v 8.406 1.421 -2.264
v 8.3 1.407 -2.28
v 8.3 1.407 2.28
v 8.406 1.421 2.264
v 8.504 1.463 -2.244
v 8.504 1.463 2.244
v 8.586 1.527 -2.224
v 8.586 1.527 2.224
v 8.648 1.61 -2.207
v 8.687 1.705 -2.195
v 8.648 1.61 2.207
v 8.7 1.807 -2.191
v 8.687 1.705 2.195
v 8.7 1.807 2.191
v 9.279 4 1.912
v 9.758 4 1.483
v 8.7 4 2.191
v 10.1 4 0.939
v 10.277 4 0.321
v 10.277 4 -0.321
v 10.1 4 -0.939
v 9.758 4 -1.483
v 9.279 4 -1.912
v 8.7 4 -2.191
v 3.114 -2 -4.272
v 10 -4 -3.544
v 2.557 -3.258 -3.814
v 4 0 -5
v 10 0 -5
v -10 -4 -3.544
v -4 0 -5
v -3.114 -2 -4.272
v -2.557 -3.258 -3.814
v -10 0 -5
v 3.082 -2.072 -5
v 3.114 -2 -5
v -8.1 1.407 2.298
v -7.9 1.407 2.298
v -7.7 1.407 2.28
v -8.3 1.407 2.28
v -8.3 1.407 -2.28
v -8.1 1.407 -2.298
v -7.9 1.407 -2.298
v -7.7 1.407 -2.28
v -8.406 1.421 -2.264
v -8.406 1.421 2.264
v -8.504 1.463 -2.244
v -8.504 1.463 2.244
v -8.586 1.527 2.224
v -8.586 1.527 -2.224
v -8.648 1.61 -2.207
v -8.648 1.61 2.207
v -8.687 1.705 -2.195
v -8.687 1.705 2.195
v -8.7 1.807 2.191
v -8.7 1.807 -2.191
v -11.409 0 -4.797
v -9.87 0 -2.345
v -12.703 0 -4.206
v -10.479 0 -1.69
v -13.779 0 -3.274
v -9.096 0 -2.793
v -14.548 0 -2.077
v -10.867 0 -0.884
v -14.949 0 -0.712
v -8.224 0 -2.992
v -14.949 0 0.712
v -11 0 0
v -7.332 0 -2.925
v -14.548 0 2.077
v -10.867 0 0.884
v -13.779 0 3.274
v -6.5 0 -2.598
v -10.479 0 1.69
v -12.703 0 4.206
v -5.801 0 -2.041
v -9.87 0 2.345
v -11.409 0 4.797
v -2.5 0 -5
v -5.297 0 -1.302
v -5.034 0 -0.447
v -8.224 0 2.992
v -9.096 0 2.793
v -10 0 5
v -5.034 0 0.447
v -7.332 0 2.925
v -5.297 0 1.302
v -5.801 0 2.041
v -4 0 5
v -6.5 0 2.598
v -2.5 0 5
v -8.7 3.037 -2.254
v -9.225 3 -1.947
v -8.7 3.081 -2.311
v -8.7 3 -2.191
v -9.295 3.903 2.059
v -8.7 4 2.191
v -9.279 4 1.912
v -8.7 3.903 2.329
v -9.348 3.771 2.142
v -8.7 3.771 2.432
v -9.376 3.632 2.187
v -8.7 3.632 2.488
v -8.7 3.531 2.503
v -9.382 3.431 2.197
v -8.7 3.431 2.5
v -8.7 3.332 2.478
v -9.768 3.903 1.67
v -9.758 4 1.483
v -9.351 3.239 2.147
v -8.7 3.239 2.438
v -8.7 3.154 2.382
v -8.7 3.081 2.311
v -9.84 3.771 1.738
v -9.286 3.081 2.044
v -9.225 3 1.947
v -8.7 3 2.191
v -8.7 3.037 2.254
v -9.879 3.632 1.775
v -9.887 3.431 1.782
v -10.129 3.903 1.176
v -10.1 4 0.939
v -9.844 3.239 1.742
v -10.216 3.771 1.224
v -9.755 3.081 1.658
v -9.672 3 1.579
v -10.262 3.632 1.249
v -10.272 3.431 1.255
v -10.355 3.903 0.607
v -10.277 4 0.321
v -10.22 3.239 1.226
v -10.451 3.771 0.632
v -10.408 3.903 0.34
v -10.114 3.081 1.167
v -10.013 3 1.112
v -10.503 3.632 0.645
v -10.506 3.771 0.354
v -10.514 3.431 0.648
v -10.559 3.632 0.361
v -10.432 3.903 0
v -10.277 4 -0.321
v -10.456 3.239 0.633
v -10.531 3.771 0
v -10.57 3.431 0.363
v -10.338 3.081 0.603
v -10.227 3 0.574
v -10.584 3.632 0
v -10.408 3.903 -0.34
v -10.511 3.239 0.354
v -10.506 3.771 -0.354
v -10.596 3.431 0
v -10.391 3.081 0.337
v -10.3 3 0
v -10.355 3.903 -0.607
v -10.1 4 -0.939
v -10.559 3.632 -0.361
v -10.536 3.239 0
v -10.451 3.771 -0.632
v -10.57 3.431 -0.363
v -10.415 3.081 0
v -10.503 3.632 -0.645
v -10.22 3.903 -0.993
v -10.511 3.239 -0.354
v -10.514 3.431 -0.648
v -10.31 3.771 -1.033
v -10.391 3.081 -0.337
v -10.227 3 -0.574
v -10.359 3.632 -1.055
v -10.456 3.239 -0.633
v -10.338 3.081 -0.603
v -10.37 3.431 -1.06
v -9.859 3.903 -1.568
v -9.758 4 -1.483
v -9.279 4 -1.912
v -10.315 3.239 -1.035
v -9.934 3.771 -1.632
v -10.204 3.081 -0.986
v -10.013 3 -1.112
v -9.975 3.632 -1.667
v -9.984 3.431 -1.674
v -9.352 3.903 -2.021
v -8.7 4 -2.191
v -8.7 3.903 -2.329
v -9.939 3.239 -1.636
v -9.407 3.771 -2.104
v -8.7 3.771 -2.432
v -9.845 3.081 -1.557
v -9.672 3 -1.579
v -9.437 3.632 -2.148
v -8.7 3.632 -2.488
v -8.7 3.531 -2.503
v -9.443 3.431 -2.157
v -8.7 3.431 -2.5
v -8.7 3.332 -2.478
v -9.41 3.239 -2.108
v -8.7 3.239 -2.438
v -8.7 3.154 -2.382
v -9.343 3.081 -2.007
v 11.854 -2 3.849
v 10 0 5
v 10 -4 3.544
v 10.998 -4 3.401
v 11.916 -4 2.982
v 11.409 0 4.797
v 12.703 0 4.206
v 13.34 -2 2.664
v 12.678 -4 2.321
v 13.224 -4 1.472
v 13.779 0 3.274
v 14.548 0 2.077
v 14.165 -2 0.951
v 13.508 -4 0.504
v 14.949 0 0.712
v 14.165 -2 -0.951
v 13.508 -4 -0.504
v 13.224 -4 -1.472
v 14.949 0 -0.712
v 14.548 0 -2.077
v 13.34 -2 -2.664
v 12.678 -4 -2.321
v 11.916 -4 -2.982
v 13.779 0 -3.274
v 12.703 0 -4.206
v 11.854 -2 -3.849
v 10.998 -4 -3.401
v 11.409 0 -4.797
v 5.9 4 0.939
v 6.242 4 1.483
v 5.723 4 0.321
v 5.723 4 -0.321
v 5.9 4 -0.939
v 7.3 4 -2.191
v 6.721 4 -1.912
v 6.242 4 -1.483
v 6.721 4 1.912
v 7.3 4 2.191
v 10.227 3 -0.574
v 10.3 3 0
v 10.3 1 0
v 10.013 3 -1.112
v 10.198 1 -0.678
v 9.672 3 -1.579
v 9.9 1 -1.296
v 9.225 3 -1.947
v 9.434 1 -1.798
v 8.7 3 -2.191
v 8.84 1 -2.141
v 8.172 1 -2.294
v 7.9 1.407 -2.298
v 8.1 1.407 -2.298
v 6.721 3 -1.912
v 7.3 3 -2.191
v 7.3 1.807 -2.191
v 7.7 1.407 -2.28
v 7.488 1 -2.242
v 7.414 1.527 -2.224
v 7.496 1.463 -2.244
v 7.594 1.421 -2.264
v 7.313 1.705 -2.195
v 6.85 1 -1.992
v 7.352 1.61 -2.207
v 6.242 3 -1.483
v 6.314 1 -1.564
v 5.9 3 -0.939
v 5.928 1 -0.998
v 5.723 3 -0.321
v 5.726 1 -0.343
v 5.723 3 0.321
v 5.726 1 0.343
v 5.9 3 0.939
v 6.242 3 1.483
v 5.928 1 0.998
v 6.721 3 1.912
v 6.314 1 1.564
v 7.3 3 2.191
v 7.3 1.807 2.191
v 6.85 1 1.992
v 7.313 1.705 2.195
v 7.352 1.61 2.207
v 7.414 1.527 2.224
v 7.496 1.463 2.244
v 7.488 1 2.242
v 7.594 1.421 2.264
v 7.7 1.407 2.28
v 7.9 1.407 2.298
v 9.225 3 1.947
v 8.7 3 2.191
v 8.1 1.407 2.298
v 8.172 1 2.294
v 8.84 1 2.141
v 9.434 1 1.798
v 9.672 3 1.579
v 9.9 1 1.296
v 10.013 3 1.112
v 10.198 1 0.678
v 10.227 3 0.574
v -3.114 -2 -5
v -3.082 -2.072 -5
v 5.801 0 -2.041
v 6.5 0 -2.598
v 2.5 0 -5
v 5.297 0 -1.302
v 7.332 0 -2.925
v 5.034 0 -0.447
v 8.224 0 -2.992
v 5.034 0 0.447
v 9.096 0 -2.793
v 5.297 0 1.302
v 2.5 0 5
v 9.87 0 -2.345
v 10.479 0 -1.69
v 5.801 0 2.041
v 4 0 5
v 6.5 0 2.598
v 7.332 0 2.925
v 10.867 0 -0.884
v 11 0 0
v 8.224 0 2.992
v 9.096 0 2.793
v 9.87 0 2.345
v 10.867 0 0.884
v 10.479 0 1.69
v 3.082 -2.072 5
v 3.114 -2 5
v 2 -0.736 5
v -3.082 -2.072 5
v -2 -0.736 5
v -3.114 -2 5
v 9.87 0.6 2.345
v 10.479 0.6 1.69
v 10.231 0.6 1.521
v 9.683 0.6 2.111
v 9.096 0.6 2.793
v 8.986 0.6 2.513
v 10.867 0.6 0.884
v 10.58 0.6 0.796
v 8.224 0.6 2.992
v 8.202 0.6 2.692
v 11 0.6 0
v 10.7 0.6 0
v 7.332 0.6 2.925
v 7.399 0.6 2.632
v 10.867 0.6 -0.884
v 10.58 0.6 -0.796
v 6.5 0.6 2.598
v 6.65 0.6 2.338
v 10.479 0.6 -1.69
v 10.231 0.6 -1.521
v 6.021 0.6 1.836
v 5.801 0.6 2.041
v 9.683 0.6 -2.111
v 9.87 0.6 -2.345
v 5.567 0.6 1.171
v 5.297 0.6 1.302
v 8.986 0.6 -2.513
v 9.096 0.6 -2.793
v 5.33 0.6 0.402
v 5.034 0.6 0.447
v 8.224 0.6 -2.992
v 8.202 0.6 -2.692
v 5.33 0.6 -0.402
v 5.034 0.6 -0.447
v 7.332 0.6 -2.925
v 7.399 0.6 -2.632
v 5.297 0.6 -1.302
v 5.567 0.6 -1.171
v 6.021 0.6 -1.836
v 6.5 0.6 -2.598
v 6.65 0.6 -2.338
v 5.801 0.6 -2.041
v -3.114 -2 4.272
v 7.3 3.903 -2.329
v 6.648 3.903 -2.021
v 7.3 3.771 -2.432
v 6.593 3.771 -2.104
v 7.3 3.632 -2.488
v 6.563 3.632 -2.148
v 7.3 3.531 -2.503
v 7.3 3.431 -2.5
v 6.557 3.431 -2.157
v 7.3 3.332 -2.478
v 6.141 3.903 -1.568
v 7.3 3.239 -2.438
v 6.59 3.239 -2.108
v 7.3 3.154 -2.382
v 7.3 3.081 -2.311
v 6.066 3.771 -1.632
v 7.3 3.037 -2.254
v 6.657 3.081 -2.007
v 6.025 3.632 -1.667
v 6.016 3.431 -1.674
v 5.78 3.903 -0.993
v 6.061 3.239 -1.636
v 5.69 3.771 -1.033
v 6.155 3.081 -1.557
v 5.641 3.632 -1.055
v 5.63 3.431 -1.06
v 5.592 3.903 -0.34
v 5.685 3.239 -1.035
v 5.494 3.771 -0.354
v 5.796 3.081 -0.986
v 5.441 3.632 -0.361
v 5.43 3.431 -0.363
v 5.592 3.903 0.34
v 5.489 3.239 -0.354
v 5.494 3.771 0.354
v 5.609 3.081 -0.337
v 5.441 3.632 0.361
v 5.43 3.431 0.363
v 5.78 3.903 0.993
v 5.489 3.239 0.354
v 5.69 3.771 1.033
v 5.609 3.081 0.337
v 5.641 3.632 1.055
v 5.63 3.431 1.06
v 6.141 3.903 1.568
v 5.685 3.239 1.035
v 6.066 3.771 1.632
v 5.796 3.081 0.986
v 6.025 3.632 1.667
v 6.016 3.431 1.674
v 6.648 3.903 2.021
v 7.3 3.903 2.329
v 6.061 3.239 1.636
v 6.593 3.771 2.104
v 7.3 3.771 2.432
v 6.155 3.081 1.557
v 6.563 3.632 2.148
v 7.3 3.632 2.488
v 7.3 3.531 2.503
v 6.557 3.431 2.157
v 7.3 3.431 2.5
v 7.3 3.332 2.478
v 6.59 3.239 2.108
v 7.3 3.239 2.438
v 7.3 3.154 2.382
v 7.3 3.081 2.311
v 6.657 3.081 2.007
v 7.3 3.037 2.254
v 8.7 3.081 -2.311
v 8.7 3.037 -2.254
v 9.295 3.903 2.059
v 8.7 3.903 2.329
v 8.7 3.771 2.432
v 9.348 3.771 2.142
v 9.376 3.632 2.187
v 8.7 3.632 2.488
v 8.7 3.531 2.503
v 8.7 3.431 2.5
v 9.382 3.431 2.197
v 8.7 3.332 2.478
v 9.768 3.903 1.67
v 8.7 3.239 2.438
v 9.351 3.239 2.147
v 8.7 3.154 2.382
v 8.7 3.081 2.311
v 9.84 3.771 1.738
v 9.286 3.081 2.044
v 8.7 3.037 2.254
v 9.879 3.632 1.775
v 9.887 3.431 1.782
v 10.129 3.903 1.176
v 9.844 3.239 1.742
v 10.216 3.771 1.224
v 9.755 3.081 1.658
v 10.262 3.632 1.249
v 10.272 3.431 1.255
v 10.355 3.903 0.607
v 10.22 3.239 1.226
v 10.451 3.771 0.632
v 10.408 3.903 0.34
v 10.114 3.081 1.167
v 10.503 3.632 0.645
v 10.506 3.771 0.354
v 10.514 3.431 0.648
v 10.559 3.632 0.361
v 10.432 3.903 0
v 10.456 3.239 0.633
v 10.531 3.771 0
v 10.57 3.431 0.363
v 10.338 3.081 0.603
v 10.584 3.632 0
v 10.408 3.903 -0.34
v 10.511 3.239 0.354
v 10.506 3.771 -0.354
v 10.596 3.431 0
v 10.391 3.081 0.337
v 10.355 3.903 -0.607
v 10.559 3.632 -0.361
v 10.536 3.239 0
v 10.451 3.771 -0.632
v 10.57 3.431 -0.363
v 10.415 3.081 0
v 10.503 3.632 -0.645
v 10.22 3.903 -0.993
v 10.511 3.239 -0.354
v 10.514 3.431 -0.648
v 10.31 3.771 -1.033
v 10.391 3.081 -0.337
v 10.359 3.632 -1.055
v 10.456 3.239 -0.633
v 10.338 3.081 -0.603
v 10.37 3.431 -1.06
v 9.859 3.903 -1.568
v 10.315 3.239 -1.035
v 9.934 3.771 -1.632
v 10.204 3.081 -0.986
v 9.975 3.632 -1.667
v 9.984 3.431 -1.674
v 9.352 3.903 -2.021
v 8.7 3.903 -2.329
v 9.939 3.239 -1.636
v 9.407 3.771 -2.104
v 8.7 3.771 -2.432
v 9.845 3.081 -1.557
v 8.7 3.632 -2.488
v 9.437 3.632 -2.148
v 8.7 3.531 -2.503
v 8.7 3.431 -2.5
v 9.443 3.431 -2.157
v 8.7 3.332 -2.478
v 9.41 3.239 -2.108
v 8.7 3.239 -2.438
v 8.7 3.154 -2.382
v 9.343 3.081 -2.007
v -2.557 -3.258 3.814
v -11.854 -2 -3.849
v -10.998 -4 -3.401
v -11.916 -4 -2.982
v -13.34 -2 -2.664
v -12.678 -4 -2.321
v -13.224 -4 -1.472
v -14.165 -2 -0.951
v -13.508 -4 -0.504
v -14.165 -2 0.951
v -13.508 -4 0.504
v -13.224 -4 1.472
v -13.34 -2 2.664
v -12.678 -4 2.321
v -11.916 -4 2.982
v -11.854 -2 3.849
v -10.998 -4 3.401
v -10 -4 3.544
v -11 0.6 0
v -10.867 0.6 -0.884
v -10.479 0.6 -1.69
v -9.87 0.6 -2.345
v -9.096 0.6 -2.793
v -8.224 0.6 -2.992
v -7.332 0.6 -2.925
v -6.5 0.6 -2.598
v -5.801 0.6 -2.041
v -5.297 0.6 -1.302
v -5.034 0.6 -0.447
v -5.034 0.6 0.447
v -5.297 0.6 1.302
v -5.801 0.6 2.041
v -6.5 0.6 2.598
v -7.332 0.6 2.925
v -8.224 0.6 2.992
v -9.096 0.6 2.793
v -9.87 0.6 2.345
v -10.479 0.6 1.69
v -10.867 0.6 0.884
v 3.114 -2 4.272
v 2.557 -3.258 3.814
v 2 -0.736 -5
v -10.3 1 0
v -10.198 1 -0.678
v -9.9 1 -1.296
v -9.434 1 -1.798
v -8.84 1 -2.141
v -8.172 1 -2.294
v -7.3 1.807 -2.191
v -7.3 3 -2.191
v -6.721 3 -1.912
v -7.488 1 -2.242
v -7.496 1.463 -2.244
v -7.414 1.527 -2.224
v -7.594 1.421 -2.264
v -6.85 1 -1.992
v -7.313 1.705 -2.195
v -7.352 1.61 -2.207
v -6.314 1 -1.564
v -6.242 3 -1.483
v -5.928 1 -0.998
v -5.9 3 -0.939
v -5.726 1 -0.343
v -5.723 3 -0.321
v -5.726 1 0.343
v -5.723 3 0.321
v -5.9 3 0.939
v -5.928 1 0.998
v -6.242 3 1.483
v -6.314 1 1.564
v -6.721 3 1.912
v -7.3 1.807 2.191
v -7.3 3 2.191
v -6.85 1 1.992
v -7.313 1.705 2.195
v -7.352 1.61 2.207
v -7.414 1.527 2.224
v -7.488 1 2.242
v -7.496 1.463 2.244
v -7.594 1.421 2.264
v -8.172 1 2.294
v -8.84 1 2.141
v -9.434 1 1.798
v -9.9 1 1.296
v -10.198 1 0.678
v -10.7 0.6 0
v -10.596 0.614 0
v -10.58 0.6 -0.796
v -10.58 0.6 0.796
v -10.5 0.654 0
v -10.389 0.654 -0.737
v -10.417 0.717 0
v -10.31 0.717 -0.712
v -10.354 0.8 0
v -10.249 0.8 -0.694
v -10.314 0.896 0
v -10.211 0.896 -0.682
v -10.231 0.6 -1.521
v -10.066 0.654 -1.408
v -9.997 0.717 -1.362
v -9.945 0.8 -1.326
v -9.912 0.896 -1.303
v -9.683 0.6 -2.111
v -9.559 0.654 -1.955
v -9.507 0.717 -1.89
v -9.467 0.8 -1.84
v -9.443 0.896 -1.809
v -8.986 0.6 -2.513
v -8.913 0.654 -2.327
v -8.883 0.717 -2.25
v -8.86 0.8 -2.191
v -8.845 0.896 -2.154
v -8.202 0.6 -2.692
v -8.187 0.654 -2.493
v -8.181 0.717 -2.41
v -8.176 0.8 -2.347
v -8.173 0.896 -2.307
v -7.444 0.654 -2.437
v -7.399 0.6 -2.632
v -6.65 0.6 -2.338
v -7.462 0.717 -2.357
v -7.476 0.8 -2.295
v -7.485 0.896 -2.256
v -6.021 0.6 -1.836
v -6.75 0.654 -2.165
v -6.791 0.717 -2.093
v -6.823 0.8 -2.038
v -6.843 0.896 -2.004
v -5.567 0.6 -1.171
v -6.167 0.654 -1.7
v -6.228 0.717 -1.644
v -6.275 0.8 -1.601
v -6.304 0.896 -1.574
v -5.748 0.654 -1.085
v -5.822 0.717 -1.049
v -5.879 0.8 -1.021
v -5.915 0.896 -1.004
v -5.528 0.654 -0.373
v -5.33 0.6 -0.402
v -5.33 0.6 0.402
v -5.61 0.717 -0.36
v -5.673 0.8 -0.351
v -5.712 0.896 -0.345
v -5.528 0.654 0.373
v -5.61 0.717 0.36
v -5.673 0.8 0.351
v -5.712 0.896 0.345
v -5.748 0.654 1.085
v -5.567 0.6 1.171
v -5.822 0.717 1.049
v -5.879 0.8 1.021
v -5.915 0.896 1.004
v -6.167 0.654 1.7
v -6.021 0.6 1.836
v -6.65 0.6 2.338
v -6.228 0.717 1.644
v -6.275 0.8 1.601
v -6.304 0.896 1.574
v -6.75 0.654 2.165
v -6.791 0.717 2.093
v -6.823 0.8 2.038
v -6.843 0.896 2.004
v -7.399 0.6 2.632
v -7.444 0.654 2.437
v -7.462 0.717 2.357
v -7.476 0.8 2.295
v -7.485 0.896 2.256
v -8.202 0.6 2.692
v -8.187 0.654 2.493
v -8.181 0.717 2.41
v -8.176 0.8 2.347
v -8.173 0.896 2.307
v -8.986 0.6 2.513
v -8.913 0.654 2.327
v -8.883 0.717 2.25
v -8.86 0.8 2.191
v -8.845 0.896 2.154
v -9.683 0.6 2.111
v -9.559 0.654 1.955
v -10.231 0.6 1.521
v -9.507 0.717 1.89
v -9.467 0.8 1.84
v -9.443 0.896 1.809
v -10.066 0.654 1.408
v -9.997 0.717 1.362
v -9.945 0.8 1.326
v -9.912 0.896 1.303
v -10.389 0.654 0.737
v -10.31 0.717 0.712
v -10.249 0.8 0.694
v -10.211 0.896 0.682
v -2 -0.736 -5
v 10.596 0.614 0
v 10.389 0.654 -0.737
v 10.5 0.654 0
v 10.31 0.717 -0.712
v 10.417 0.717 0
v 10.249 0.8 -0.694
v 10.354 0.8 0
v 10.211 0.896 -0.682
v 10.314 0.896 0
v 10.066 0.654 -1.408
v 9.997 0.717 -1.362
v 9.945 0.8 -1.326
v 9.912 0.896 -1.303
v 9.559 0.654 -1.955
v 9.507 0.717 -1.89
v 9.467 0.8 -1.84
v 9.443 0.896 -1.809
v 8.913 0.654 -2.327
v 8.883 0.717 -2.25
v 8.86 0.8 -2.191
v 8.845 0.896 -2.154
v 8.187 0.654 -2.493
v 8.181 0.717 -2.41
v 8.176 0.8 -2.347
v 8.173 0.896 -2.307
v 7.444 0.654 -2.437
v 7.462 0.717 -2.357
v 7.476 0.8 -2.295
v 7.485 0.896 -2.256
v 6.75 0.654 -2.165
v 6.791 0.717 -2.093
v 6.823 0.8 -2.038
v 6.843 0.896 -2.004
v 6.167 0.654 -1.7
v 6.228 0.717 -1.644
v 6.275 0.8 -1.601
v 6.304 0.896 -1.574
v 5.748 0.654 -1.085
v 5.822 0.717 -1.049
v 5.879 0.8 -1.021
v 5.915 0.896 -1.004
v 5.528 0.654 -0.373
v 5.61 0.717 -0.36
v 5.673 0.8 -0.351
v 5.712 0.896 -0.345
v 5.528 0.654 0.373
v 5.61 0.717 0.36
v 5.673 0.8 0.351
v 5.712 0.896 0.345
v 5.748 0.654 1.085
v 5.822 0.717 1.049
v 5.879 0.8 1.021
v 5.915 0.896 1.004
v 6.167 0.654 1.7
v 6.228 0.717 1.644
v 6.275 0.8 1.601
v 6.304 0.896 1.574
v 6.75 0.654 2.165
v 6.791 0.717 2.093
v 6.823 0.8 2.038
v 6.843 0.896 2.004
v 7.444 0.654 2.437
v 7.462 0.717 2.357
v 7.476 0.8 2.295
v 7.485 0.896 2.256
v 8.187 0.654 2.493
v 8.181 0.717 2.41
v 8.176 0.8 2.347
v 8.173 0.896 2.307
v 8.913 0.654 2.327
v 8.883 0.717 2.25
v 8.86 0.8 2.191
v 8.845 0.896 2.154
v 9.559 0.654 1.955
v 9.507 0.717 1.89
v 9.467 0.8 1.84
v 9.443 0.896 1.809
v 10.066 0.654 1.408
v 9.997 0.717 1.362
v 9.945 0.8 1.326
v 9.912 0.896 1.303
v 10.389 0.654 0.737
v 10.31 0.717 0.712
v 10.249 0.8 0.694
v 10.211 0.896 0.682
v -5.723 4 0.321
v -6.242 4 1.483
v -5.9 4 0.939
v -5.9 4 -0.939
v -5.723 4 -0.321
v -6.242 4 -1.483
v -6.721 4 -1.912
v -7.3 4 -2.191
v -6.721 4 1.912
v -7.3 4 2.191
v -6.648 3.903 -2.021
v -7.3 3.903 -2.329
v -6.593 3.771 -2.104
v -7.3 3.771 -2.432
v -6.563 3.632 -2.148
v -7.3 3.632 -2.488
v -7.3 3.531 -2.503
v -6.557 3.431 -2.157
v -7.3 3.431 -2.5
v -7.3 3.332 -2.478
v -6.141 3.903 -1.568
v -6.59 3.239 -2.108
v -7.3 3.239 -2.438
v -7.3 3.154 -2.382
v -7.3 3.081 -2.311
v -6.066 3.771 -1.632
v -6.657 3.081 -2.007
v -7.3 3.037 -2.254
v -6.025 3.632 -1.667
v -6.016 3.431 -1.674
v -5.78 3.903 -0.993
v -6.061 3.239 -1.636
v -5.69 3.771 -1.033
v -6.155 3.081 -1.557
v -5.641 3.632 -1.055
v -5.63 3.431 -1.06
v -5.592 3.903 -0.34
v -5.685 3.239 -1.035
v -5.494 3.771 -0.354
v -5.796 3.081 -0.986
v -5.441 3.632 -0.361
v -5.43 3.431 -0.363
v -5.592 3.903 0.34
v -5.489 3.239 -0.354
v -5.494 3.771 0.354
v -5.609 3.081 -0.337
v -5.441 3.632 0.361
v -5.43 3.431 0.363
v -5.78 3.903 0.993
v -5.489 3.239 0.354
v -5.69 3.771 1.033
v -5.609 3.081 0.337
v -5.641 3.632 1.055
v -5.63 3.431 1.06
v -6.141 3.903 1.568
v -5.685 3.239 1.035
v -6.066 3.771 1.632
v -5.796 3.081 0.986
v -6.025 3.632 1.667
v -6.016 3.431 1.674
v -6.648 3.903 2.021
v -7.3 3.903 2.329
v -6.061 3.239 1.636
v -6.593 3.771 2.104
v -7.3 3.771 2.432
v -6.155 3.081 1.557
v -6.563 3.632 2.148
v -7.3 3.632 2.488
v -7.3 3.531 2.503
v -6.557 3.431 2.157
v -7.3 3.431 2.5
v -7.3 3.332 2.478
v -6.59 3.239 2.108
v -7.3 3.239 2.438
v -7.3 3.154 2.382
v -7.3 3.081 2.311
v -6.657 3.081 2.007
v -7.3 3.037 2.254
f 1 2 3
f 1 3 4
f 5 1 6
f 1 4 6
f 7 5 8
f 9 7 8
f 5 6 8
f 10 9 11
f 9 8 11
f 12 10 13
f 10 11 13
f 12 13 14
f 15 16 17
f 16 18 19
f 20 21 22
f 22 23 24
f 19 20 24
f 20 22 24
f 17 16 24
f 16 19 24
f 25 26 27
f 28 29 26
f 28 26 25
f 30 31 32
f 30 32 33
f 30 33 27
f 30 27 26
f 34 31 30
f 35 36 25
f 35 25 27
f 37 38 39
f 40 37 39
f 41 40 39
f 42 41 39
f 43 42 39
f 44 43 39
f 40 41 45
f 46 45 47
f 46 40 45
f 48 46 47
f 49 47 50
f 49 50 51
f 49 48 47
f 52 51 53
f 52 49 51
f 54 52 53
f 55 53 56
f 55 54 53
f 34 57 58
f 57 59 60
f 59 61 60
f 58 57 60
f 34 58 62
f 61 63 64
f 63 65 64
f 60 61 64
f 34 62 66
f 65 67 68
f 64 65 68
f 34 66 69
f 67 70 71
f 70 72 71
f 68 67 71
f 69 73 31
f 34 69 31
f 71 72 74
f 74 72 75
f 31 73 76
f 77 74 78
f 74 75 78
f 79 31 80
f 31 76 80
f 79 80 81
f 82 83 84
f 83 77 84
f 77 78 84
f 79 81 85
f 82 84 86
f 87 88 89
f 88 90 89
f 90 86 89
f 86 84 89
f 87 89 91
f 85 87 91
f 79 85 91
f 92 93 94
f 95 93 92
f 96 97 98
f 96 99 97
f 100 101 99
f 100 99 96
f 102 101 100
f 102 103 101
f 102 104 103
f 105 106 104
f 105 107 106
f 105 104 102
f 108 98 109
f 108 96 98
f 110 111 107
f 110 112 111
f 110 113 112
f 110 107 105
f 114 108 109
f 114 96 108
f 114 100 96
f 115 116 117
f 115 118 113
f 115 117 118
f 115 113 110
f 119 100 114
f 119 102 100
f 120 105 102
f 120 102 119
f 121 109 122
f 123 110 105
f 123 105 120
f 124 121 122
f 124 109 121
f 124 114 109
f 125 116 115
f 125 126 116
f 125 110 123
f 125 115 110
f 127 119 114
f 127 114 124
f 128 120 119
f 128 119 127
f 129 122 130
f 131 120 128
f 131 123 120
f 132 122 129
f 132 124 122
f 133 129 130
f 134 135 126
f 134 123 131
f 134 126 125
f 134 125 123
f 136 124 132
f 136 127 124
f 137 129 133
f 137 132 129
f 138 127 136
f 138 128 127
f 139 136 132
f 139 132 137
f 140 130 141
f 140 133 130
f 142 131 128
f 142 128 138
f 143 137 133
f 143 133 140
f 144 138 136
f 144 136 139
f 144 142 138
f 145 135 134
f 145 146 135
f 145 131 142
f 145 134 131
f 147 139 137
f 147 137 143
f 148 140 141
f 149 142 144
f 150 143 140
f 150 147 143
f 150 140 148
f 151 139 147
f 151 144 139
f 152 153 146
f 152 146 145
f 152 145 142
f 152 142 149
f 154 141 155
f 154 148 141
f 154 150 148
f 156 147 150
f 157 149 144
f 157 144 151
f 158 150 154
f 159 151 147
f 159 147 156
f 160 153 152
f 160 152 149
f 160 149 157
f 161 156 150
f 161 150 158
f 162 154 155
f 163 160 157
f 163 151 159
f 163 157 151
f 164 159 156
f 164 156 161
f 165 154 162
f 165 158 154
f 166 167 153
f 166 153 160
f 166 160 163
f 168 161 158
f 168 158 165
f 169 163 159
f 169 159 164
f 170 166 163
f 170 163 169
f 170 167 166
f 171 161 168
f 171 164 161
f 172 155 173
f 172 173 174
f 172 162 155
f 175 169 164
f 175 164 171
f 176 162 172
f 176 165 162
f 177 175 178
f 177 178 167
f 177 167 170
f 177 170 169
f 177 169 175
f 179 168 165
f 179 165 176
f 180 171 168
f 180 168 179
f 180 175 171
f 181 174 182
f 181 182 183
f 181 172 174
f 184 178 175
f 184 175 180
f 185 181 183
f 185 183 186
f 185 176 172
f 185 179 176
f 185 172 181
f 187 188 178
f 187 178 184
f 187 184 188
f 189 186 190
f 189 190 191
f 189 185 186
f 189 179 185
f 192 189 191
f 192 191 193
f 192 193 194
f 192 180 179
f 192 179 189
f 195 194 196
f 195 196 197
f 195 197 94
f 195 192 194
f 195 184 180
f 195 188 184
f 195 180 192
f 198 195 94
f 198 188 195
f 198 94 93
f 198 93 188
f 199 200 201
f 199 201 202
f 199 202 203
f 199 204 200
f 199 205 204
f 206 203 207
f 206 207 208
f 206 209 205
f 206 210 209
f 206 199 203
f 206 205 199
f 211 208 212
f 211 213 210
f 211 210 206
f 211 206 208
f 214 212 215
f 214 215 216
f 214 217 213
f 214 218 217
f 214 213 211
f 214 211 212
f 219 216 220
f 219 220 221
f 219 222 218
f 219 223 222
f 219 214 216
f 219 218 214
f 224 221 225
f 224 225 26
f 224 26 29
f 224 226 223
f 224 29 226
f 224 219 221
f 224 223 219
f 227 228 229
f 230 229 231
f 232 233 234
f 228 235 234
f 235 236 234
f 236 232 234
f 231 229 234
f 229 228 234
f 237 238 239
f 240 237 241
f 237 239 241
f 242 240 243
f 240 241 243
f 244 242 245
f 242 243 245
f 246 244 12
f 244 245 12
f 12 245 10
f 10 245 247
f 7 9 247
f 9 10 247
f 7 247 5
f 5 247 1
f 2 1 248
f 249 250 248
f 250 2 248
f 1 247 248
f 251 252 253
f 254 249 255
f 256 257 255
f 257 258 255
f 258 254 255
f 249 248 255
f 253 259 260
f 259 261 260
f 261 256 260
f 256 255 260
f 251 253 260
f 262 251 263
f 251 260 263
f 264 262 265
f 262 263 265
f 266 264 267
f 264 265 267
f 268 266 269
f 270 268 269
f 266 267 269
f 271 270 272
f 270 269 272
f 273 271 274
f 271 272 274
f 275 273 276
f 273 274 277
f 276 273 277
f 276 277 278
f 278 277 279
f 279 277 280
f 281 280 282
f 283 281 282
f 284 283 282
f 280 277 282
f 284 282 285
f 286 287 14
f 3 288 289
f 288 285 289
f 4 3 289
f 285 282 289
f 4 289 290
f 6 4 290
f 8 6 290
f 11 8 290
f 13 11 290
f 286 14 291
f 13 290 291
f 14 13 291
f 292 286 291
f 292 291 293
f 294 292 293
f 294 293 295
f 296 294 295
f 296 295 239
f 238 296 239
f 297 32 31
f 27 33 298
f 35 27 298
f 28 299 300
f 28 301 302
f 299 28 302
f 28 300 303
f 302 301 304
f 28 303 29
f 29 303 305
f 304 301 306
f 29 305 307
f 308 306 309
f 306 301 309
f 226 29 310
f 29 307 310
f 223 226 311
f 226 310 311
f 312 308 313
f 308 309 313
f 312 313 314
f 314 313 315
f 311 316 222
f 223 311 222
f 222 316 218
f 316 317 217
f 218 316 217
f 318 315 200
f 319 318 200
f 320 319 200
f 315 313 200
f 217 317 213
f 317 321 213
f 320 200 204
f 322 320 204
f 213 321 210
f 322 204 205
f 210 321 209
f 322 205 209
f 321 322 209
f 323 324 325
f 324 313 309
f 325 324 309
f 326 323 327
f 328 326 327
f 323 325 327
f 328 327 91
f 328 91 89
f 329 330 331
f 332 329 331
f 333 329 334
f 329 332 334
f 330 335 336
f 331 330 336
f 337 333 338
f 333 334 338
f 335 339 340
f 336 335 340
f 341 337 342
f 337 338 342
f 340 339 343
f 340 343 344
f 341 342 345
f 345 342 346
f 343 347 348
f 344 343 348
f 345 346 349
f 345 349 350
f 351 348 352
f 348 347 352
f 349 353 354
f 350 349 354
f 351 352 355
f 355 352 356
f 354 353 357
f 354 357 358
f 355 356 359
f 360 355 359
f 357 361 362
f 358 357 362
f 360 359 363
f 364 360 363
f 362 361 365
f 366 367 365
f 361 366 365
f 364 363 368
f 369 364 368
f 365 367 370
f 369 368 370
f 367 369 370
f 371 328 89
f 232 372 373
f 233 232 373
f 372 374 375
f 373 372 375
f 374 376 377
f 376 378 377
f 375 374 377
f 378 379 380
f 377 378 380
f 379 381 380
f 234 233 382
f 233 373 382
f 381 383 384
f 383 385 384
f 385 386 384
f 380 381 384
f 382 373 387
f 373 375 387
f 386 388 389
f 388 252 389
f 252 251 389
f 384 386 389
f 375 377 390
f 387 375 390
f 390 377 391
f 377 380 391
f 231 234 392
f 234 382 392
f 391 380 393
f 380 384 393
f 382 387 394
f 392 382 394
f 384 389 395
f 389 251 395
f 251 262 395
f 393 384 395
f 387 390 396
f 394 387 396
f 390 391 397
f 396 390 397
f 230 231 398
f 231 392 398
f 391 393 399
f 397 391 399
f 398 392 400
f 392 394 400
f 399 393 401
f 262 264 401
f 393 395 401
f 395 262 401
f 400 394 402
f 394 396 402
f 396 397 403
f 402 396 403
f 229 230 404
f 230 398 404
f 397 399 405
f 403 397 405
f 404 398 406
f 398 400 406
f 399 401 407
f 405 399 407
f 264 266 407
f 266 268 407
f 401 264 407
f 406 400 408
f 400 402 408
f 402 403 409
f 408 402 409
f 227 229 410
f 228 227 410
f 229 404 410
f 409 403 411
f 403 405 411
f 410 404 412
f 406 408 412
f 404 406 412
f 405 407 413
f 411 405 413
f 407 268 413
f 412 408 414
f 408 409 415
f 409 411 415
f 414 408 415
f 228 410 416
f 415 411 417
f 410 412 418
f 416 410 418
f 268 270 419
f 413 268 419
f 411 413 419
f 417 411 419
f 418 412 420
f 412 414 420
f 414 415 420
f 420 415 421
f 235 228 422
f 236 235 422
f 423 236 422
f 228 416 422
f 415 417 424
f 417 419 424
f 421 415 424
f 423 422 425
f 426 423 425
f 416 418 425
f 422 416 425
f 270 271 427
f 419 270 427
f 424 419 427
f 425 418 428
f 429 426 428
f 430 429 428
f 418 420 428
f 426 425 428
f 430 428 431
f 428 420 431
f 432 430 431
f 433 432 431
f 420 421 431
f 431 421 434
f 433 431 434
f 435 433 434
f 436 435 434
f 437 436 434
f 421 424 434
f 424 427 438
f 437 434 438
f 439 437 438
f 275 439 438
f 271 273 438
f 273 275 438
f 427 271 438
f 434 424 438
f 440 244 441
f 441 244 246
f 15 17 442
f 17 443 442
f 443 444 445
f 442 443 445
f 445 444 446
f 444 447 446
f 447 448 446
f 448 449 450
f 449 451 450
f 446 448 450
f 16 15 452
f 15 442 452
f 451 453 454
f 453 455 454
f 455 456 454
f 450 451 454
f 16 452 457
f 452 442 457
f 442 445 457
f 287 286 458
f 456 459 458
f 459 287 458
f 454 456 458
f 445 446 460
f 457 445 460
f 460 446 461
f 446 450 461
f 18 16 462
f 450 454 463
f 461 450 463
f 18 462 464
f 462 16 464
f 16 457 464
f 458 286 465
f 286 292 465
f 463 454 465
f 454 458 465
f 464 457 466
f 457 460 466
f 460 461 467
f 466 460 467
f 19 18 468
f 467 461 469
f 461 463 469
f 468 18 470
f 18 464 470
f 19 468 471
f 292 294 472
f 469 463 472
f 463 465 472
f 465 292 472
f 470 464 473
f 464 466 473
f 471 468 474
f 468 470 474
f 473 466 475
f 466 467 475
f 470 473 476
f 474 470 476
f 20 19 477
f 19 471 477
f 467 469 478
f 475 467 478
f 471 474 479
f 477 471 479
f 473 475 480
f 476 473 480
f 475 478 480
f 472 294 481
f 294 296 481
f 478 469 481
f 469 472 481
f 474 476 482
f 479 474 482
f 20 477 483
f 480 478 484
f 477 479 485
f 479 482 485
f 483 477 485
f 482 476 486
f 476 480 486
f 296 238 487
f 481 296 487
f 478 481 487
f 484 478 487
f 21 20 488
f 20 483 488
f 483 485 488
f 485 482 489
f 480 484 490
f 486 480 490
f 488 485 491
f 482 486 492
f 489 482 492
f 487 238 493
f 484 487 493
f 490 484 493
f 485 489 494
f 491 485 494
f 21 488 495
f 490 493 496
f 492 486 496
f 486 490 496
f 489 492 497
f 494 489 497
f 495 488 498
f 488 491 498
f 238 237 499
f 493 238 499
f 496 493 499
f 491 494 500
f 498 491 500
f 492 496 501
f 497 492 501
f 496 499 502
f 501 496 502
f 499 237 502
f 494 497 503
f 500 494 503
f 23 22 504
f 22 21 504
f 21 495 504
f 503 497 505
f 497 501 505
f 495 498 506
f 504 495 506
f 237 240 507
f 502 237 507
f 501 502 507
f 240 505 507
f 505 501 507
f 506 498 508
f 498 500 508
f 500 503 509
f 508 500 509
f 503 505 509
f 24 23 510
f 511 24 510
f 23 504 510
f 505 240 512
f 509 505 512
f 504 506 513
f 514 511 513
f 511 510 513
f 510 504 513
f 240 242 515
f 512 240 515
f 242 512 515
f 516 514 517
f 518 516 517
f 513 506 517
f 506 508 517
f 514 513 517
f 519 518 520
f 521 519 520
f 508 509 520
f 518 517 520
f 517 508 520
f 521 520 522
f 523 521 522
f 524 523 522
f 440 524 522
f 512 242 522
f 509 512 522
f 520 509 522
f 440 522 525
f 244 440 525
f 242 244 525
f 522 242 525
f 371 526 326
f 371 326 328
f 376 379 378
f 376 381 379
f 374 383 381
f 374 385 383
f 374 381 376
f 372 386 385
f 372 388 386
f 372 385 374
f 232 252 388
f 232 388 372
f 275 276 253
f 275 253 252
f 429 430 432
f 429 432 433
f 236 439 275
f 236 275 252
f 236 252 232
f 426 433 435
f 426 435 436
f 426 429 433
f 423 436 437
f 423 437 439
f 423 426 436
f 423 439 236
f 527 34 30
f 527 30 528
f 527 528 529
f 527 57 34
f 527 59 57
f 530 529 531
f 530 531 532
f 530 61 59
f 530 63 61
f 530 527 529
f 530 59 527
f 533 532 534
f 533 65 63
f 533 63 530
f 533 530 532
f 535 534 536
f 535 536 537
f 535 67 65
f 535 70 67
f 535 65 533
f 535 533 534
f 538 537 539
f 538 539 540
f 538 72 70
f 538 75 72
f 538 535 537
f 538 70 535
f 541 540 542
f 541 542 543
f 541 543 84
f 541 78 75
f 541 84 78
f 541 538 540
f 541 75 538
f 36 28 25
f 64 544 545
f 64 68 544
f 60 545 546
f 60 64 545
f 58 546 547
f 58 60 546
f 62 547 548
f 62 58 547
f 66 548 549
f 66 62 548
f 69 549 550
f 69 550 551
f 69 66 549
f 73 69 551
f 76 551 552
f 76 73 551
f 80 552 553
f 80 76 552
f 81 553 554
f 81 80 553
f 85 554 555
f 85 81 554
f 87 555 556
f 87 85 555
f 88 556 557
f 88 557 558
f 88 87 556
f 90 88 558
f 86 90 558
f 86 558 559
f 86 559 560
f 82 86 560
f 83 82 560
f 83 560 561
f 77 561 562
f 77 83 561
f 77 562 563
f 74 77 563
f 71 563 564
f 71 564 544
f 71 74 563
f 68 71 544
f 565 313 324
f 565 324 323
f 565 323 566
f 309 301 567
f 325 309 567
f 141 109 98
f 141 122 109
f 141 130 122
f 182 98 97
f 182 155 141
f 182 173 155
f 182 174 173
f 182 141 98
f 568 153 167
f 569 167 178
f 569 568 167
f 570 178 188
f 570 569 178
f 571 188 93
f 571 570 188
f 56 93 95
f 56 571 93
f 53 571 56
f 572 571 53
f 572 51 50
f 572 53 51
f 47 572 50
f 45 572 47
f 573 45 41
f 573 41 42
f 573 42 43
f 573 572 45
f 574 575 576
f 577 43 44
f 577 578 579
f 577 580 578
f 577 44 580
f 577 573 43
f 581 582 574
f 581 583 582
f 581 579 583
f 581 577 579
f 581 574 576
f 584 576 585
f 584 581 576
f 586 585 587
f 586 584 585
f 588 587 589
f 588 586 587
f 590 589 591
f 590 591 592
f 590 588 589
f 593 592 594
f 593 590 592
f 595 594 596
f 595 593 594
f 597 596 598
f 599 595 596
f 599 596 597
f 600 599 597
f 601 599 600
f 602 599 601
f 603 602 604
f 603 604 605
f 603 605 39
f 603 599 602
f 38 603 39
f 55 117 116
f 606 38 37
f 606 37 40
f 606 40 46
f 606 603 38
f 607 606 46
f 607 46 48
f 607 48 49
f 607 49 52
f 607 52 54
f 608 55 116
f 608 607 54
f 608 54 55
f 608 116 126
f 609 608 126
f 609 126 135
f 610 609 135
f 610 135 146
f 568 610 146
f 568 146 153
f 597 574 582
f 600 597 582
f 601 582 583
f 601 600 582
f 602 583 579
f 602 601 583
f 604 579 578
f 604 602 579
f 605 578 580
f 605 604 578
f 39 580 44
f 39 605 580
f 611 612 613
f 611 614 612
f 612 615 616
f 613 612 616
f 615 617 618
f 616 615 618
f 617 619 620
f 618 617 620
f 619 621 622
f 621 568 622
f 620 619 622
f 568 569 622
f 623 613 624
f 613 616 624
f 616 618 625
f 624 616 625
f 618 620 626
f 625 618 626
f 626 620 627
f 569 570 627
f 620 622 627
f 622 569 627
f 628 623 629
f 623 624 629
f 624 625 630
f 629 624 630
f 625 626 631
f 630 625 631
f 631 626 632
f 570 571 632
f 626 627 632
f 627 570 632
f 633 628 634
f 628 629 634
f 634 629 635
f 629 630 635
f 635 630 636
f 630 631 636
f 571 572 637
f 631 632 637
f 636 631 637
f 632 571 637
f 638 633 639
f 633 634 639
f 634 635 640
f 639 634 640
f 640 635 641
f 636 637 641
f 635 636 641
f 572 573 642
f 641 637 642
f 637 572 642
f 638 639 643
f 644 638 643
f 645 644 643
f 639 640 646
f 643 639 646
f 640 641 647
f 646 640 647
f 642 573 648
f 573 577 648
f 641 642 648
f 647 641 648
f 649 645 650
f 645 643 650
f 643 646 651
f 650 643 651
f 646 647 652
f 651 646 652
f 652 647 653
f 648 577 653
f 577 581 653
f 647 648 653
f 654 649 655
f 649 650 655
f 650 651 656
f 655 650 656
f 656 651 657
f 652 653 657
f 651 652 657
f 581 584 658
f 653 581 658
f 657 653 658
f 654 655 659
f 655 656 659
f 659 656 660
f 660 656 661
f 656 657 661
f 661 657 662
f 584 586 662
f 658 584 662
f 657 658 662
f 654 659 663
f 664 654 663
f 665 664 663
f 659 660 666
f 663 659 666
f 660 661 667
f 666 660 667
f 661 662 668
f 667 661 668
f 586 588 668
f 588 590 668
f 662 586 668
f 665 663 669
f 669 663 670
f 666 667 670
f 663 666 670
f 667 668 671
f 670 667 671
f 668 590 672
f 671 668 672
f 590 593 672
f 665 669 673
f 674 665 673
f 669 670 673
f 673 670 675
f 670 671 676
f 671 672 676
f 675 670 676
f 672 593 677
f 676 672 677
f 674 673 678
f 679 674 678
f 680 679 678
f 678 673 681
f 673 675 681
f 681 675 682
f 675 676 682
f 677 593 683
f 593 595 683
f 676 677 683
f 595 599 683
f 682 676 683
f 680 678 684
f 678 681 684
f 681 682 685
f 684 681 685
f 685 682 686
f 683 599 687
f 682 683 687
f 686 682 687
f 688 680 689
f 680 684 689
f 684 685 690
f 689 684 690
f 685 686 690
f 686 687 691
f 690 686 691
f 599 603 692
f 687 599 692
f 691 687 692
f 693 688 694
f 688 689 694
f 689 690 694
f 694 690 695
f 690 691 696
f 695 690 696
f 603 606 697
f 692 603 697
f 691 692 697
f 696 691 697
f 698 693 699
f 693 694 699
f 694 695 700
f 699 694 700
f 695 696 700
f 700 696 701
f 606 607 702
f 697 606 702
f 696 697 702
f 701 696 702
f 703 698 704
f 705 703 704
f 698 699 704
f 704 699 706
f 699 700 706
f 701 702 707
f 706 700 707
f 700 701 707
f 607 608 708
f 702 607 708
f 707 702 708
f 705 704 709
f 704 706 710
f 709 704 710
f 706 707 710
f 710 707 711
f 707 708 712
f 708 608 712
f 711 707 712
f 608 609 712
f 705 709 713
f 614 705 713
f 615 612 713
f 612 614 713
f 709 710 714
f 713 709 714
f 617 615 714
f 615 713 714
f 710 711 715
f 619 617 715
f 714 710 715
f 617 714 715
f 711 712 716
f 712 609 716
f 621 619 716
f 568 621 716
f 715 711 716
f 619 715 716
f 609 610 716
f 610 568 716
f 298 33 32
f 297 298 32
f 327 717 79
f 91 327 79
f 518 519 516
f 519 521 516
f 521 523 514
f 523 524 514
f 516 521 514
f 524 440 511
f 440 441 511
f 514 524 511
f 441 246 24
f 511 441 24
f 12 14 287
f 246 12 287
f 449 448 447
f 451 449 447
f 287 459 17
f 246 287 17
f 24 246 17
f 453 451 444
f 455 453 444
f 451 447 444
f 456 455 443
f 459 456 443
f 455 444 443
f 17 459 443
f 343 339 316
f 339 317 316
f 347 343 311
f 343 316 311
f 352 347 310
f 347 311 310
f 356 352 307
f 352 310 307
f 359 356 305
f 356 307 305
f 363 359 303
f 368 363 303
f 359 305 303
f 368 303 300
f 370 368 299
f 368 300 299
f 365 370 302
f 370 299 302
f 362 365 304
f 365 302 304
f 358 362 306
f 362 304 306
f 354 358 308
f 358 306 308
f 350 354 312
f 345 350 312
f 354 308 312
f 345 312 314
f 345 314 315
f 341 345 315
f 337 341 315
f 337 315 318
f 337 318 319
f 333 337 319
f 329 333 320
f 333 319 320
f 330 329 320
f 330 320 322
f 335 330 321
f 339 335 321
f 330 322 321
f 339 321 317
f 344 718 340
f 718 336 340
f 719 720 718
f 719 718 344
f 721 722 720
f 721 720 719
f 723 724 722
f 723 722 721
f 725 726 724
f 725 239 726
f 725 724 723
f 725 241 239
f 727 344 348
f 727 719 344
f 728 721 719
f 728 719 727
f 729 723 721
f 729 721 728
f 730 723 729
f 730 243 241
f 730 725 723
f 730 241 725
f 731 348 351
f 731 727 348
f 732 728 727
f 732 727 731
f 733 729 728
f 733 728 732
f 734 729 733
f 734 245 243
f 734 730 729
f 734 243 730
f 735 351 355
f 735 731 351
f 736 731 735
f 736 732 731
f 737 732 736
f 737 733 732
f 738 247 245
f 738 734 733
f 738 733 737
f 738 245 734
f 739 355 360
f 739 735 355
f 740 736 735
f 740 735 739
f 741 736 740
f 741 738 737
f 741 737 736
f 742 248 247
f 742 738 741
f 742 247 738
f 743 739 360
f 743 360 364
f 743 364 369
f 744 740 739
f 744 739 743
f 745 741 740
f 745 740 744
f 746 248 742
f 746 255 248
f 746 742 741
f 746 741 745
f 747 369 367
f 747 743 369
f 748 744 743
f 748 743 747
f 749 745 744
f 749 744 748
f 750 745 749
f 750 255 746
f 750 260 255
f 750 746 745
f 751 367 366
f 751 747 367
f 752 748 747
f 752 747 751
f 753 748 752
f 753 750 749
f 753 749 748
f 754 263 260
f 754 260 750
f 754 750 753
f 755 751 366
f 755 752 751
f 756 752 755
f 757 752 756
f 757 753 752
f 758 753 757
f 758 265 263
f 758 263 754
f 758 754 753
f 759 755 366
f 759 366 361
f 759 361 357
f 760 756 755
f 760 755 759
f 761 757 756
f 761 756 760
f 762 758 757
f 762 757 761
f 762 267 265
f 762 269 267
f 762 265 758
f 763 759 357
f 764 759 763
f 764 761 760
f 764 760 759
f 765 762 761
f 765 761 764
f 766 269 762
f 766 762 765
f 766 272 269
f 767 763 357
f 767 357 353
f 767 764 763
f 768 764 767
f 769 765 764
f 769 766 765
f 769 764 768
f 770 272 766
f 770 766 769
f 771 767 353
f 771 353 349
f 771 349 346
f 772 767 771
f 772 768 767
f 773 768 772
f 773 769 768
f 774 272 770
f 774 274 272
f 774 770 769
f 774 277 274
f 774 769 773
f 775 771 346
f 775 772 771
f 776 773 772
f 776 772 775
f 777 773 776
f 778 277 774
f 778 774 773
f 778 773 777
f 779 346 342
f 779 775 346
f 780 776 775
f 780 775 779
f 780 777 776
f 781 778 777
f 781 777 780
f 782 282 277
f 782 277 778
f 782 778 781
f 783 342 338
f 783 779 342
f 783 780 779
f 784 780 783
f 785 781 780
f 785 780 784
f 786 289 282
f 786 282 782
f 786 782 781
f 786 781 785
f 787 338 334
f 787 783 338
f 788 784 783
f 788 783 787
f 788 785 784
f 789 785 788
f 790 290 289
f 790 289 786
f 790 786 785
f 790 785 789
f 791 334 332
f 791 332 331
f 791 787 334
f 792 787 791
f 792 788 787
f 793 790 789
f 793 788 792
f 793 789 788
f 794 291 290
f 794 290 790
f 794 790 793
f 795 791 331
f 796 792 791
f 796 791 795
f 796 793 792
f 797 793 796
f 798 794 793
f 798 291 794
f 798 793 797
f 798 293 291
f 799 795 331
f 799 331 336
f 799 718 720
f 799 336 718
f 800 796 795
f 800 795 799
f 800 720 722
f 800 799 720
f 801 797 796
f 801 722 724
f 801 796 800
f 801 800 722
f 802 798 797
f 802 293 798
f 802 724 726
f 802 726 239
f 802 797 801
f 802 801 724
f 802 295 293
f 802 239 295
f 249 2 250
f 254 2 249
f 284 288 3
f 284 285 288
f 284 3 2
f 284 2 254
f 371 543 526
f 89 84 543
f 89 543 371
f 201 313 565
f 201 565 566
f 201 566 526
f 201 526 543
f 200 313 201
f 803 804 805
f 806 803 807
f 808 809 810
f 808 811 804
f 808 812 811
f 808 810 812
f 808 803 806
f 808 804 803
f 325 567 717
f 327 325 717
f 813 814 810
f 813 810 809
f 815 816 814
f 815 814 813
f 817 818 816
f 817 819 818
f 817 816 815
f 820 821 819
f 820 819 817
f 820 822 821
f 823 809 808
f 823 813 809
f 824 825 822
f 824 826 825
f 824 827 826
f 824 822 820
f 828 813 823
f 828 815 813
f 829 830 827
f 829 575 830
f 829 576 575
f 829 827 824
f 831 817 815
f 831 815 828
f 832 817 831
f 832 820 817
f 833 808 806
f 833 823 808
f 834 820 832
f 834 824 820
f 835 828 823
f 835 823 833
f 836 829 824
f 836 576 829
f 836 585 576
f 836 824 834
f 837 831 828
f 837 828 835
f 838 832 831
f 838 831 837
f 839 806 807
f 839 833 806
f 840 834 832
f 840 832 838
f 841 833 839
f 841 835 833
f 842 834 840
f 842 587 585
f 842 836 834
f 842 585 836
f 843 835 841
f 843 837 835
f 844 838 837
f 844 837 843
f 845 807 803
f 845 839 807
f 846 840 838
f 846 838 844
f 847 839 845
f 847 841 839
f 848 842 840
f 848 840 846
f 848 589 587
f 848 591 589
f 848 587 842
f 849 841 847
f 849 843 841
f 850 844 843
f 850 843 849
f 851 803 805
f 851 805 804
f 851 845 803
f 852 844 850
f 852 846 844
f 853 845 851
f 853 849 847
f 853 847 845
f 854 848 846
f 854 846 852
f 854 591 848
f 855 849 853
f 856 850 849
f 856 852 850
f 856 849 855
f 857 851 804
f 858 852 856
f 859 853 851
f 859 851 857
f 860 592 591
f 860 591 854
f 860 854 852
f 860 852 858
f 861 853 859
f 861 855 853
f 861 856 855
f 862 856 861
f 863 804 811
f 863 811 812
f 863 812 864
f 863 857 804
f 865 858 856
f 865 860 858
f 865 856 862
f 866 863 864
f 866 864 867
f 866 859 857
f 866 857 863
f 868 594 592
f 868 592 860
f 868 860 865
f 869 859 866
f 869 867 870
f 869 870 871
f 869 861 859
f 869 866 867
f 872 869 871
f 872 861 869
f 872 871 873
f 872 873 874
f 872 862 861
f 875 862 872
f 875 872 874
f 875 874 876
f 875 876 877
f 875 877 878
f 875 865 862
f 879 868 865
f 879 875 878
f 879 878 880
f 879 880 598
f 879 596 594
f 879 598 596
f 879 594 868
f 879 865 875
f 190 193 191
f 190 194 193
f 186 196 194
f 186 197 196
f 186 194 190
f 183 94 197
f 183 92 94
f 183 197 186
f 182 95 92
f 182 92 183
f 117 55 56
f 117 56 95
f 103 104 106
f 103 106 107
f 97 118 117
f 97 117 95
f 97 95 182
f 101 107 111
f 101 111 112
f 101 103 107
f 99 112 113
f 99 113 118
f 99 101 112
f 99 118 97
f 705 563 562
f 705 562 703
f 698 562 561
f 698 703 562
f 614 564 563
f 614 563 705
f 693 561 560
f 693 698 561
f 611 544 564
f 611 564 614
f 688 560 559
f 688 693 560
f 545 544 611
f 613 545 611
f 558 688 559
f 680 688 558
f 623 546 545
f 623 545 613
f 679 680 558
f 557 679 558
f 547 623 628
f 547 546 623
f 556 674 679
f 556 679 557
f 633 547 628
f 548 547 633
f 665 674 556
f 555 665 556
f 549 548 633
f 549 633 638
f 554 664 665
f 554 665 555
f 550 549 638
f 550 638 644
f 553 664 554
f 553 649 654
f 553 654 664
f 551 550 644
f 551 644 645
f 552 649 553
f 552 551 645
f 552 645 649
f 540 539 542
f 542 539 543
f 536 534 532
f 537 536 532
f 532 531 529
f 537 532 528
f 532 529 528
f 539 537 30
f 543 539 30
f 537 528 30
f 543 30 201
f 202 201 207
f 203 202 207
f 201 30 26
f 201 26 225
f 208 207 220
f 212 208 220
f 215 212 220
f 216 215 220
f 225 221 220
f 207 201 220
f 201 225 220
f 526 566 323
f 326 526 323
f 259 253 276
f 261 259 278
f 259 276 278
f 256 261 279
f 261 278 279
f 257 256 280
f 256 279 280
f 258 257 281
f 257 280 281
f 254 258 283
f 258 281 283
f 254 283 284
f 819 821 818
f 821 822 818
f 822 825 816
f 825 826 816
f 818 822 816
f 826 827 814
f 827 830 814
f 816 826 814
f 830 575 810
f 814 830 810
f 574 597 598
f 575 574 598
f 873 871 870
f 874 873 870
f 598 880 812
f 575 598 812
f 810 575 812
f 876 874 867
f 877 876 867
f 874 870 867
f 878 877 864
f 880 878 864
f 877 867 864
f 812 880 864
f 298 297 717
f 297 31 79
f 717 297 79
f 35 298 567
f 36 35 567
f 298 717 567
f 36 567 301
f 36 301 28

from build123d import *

# Parameters (mm, degrees)
BOSS_EXTRUDE1_DEPTH     = 4
BOSS_EXTRUDE1_DRAFT     = -20
SKETCH3_W               = 1.4
SKETCH3_H               = 6
CUT_EXTRUDE1_DEPTH      = 17.309506455
FILLET1_R               = 0.4
FILLET1_OF_MIRROR1_R    = 0.4
BOSS_EXTRUDE2_DEPTH     = 5
CHAMFER1_SIZE           = 1.338525748
CHAMFER1_SIZE_2         = 0.8
CUT_EXTRUDE2_DEPTH      = 17.309506455
CUT_EXTRUDE2_DEPTH_BACK = 17.309506455


with BuildPart() as part:
    # Sketch1 → Boss-Extrude1 (with draft: the straight prism first)
    with BuildSketch(Plane(origin=(0, 0, 0), x_dir=(1, 0, 0), z_dir=(0, 1, 0))):
        with BuildLine():
            ThreePointArc((-10, 5), (-15, 0), (-10, -5))
            Line((-10, -5), (10, -5))
            ThreePointArc((10, -5), (15, 0), (10, 5))
            Line((10, 5), (-10, 5))
        make_face()
    extrude(amount=-BOSS_EXTRUDE1_DEPTH)
    # Boss-Extrude1: the draft: its side faces are tilted about the plane it starts from
    boss_extrude1_sides = [part.faces().sort_by_distance(p)[0] for p in [
        (-15, -2, 0),
        (0, -2, 5),
        (15, -2, 0),
        (0, -2, -5),
    ]]
    draft(boss_extrude1_sides, Plane(origin=(0, 0, 0), x_dir=(1, 0, 0), z_dir=(0, 1, 0)), BOSS_EXTRUDE1_DRAFT)

    # Sketch2 → Revolve1 (revolve)
    with BuildSketch(Plane.XY, mode=Mode.PRIVATE) as revolve1_sk:
        with BuildLine():
            Line((-5, 0), (-8, 0))
            Line((-8, 0), (-8, 4))
            Line((-8, 4), (-5.7, 4))
            ThreePointArc((-5.7, 4), (-5.4, 3.5), (-5.7, 3))
            Line((-5.7, 3), (-5.7, 0.6))
            Line((-5.7, 0.6), (-5, 0.6))
            Line((-5, 0.6), (-5, 0))
        make_face()
    revolve1 = revolve(revolve1_sk.sketch.rotate(Axis((-8, 4.406807082, 0), (0, -1, 0)), 180), axis=Axis((-8, 4.406807082, 0), (0, -1, 0)))

    # Sketch3 → Cut-Extrude1 (cut, symmetric)
    with BuildSketch(Plane.XY):
        with Locations((-8, 4.406807082)):
            Rectangle(SKETCH3_W, SKETCH3_H)
    cut_extrude1 = extrude(amount=CUT_EXTRUDE1_DEPTH, both=True, mode=Mode.SUBTRACT)

    # Fillet1
    fillet1_edges = [part.edges().sort_by_distance(p)[0] for p in [
        (-5.7, 0.6, 0),
        (-7.3, 1.406807082, 0),
        (-8.7, 1.406807082, 0),
    ]]
    fillet(fillet1_edges, radius=FILLET1_R)

    # Mirror1: Revolve1, Cut-Extrude1 across plane
    add(revolve1.mirror(Plane(origin=(0, 0, 0), x_dir=(0, 0, 1), z_dir=(1, 0, 0))))
    add(cut_extrude1.mirror(Plane(origin=(0, 0, 0), x_dir=(0, 0, 1), z_dir=(1, 0, 0))), mode=Mode.SUBTRACT)

    # Fillet1 of Mirror1
    fillet1_of_mirror1_edges = [part.edges().sort_by_distance(p)[0] for p in [
        (5.7, 0.6, 0),
        (7.3, 1.406807082, 0),
        (8.7, 1.406807082, 0),
    ]]
    fillet(fillet1_of_mirror1_edges, radius=FILLET1_OF_MIRROR1_R)

    # Sketch4 → Boss-Extrude2 (add, symmetric)
    with BuildSketch(Plane.XY):
        Polygon((-4, 0), (4, 0), (3.114229495, -2), (-3.114229495, -2), align=None)
    extrude(amount=BOSS_EXTRUDE2_DEPTH, both=True)

    # Chamfer1
    # the kernel refuses this chamfer: 1.338525748, 0.8 mm, written as the material it adds along each edge
    with BuildSketch(Plane(origin=(6.582316876, -2, 4.272059531), x_dir=(0, -0.9339888612507298, -0.3573021229429867), z_dir=(-1, 0, 0))) as chamfer1_piece_1_section:
        Polygon((CHAMFER1_SIZE * 0.999866964174, CHAMFER1_SIZE * 0.0163111641321), (-CHAMFER1_SIZE_2 * 0.357302122943, CHAMFER1_SIZE_2 * 0.933988861251), (0, 0), align=None)
    chamfer1_piece_1 = extrude(amount=13.164633752, mode=Mode.PRIVATE)
    chamfer1_piece_1 = split(chamfer1_piece_1, bisect_by=Plane(origin=(-2.45134628, -3.496738063, 4.375919387), z_dir=(0.9143398734593109, 0.40494764575486975, 0)), keep=Keep.TOP, mode=Mode.PRIVATE)
    chamfer1_piece_1 = split(chamfer1_piece_1, bisect_by=Plane(origin=(2.45134628, -3.496738063, 4.375919387), z_dir=(-0.914339873459311, 0.40494764575486936, 0)), keep=Keep.TOP, mode=Mode.PRIVATE)
    chamfer1_piece_1 = split(chamfer1_piece_1, bisect_by=Plane(origin=(0, -2.411072946, 5), z_dir=(0, 0, -1)), keep=Keep.TOP, mode=Mode.PRIVATE)
    add(chamfer1_piece_1)
    with BuildSketch(Plane(origin=(-6.582316876, -2, -4.272059531), x_dir=(0, -0.9339888612507298, 0.3573021229429865), z_dir=(1, 0, 0))) as chamfer1_piece_2_section:
        Polygon((CHAMFER1_SIZE * 0.999866964174, CHAMFER1_SIZE * 0.0163111641321), (-CHAMFER1_SIZE_2 * 0.357302122943, CHAMFER1_SIZE_2 * 0.933988861251), (0, 0), align=None)
    chamfer1_piece_2 = extrude(amount=13.164633752, mode=Mode.PRIVATE)
    chamfer1_piece_2 = split(chamfer1_piece_2, bisect_by=Plane(origin=(2.45134628, -3.496738063, -4.375919387), z_dir=(-0.914339873459311, 0.40494764575486936, 0)), keep=Keep.TOP, mode=Mode.PRIVATE)
    chamfer1_piece_2 = split(chamfer1_piece_2, bisect_by=Plane(origin=(-2.45134628, -3.496738063, -4.375919387), z_dir=(0.9143398734593109, 0.40494764575486975, 0)), keep=Keep.TOP, mode=Mode.PRIVATE)
    chamfer1_piece_2 = split(chamfer1_piece_2, bisect_by=Plane(origin=(0, -2.411072946, -5), z_dir=(0, 0, 1)), keep=Keep.TOP, mode=Mode.PRIVATE)
    add(chamfer1_piece_2)

    # Sketch5 → Cut-Extrude2 (cut, two sides: drawn at the far end of the back side and taken through both)
    with BuildSketch(Plane.XY.offset(-CUT_EXTRUDE2_DEPTH_BACK)):
        Polygon((-2.5, 0), (2.5, 0), (2, -0.735655285), (-2, -0.735655285), align=None)
    extrude(amount=CUT_EXTRUDE2_DEPTH + CUT_EXTRUDE2_DEPTH_BACK, mode=Mode.SUBTRACT)


solid = part.part
